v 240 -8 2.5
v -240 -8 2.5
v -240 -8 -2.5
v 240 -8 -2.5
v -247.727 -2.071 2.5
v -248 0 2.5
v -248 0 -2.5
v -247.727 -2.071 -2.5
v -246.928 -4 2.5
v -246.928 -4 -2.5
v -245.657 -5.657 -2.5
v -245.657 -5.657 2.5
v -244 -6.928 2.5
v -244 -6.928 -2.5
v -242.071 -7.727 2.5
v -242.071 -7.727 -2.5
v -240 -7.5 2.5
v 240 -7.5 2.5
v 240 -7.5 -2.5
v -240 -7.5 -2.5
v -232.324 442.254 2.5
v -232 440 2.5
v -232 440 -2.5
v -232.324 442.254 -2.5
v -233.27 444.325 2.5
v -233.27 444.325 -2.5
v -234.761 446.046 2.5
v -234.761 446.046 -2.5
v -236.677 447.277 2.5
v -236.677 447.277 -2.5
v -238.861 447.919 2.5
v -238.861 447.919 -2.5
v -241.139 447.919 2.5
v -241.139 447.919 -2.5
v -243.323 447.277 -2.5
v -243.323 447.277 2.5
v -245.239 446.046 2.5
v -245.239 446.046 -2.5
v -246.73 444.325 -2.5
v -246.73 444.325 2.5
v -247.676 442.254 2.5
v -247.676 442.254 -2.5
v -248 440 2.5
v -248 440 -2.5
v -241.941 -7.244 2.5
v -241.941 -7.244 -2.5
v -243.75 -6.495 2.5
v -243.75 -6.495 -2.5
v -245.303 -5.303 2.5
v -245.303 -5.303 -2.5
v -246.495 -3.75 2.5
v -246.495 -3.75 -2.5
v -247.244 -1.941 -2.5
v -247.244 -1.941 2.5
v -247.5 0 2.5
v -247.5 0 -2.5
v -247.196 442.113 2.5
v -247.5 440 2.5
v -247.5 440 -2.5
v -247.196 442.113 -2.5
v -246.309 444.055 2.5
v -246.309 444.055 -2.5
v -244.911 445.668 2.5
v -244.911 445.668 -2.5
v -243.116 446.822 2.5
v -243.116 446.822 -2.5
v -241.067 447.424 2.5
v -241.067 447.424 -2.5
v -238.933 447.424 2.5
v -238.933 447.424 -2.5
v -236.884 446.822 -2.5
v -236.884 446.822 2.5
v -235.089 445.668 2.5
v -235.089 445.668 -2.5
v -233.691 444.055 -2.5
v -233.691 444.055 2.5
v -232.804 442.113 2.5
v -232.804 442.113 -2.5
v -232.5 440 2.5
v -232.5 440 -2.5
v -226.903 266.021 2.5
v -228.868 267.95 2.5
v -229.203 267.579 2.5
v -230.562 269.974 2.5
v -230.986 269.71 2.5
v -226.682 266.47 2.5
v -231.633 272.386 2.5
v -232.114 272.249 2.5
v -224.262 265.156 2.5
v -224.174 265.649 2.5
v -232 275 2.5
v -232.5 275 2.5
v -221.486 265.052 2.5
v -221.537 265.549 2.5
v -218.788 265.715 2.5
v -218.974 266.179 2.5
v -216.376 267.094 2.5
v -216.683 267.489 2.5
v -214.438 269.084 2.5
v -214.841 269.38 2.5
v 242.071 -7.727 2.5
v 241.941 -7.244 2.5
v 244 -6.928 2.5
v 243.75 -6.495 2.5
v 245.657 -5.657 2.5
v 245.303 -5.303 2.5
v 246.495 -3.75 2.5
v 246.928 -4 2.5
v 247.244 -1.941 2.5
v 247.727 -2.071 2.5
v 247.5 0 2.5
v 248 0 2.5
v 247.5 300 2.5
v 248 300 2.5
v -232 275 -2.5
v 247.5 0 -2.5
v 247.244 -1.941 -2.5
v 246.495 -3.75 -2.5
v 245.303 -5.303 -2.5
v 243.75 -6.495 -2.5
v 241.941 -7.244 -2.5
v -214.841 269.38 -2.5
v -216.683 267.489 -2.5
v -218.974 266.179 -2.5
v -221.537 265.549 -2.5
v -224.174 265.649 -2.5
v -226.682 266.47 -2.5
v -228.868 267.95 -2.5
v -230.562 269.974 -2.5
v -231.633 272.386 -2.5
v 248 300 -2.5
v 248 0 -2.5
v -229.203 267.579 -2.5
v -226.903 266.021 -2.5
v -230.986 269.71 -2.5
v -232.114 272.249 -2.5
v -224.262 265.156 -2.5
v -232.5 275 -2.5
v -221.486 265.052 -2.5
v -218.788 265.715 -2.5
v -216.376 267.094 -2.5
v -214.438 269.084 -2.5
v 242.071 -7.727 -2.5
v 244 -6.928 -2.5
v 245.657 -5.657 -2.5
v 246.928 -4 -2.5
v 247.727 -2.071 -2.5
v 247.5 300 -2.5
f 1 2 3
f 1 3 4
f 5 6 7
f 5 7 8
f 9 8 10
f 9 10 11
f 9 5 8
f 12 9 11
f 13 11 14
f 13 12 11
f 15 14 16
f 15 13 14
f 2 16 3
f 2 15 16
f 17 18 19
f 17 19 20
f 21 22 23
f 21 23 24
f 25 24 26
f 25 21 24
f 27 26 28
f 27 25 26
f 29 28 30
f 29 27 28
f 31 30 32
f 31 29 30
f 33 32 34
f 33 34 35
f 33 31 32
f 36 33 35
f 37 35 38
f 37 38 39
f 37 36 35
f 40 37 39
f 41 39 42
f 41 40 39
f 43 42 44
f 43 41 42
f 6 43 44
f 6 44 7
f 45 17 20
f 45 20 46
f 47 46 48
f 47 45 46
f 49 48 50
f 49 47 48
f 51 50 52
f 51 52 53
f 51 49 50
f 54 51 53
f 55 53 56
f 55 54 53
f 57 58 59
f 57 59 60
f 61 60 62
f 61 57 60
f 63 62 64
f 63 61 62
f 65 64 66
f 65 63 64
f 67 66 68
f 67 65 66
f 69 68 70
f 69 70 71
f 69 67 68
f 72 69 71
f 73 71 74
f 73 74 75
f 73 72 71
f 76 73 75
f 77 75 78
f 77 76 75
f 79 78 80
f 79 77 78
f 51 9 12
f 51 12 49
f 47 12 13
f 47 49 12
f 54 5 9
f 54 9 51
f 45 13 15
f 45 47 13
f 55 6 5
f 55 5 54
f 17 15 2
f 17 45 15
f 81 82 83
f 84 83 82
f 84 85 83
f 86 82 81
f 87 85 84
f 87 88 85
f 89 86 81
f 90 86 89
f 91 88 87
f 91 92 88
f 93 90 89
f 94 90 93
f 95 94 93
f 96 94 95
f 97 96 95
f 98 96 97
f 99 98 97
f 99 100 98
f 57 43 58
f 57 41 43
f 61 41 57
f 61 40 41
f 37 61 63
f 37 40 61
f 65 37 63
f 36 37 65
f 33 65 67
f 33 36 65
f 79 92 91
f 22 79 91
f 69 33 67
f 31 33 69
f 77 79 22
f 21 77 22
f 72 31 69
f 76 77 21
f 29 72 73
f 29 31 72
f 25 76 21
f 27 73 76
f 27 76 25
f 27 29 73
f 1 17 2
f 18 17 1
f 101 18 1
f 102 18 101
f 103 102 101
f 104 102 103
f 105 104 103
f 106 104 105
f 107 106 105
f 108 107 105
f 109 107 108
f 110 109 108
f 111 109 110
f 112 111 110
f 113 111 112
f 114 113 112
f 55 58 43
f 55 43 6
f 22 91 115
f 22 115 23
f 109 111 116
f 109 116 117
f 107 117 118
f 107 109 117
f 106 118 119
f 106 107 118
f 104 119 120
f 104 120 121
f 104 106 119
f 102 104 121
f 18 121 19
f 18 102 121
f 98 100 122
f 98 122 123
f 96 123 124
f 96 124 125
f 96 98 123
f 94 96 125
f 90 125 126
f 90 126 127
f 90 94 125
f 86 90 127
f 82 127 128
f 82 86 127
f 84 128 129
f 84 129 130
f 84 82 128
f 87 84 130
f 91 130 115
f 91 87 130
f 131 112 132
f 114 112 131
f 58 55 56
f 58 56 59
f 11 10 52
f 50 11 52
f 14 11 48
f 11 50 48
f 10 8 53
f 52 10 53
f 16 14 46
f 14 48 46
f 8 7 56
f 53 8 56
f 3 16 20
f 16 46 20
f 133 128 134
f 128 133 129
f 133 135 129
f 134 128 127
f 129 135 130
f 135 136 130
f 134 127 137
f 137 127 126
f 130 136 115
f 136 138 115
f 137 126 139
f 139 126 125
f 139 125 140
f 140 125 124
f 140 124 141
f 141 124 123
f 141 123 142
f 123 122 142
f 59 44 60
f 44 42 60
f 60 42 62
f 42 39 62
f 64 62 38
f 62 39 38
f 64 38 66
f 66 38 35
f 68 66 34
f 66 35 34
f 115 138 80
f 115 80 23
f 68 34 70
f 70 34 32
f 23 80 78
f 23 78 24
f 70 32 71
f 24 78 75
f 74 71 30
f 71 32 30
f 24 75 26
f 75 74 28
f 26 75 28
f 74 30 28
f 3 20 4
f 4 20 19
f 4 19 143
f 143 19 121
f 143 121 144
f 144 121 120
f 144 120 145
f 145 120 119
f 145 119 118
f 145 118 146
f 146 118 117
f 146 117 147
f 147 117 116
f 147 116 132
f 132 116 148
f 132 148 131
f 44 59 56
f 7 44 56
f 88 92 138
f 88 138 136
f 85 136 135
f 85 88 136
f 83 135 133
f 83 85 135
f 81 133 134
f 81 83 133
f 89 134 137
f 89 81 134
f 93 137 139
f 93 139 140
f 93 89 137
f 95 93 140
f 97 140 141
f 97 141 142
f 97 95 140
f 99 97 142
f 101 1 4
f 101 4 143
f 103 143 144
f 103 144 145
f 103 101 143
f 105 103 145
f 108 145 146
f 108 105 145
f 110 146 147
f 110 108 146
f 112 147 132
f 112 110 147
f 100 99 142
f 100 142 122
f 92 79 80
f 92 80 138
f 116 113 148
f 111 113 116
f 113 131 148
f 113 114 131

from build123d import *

# Parameters (mm, degrees)
LINEAR_AUSTRAGEN_D_NN1_DEPTH = 2.5


with BuildPart() as part:
    # Skizze1 → Linear-Austragen-Dünn1 (new, symmetric)
    with BuildSketch(Plane.XY):
        with BuildLine():
            Line((247.5, 300), (247.5, 0))
            ThreePointArc((247.5, 0), (245.303300859, -5.303300859), (240, -7.5))
            Line((240, -7.5), (-240, -7.5))
            ThreePointArc((-240, -7.5), (-245.303300859, -5.303300859), (-247.5, 0))
            Line((-247.5, 0), (-247.5, 440))
            ThreePointArc((-247.5, 440), (-240, 447.5), (-232.5, 440))
            Line((-232.5, 440), (-232.5, 275))
            ThreePointArc((-232.5, 275), (-225.612554872, 265.496737288), (-214.437599567, 269.084114669))
            Line((-214.437599567, 269.084114669), (-214.840719588, 269.379908935))
            ThreePointArc((-214.840719588, 269.379908935), (-225.456927129, 265.971900424), (-232, 275))
            Line((-232, 275), (-232, 440))
            ThreePointArc((-232, 440), (-240, 448), (-248, 440))
            Line((-248, 440), (-248, 0))
            ThreePointArc((-248, 0), (-245.656854249, -5.656854249), (-240, -8))
            Line((-240, -8), (240, -8))
            ThreePointArc((240, -8), (245.656854249, -5.656854249), (248, 0))
            Line((248, 0), (248, 300))
            Line((248, 300), (247.5, 300))
        make_face()
    extrude(amount=LINEAR_AUSTRAGEN_D_NN1_DEPTH, both=True)


solid = part.part
